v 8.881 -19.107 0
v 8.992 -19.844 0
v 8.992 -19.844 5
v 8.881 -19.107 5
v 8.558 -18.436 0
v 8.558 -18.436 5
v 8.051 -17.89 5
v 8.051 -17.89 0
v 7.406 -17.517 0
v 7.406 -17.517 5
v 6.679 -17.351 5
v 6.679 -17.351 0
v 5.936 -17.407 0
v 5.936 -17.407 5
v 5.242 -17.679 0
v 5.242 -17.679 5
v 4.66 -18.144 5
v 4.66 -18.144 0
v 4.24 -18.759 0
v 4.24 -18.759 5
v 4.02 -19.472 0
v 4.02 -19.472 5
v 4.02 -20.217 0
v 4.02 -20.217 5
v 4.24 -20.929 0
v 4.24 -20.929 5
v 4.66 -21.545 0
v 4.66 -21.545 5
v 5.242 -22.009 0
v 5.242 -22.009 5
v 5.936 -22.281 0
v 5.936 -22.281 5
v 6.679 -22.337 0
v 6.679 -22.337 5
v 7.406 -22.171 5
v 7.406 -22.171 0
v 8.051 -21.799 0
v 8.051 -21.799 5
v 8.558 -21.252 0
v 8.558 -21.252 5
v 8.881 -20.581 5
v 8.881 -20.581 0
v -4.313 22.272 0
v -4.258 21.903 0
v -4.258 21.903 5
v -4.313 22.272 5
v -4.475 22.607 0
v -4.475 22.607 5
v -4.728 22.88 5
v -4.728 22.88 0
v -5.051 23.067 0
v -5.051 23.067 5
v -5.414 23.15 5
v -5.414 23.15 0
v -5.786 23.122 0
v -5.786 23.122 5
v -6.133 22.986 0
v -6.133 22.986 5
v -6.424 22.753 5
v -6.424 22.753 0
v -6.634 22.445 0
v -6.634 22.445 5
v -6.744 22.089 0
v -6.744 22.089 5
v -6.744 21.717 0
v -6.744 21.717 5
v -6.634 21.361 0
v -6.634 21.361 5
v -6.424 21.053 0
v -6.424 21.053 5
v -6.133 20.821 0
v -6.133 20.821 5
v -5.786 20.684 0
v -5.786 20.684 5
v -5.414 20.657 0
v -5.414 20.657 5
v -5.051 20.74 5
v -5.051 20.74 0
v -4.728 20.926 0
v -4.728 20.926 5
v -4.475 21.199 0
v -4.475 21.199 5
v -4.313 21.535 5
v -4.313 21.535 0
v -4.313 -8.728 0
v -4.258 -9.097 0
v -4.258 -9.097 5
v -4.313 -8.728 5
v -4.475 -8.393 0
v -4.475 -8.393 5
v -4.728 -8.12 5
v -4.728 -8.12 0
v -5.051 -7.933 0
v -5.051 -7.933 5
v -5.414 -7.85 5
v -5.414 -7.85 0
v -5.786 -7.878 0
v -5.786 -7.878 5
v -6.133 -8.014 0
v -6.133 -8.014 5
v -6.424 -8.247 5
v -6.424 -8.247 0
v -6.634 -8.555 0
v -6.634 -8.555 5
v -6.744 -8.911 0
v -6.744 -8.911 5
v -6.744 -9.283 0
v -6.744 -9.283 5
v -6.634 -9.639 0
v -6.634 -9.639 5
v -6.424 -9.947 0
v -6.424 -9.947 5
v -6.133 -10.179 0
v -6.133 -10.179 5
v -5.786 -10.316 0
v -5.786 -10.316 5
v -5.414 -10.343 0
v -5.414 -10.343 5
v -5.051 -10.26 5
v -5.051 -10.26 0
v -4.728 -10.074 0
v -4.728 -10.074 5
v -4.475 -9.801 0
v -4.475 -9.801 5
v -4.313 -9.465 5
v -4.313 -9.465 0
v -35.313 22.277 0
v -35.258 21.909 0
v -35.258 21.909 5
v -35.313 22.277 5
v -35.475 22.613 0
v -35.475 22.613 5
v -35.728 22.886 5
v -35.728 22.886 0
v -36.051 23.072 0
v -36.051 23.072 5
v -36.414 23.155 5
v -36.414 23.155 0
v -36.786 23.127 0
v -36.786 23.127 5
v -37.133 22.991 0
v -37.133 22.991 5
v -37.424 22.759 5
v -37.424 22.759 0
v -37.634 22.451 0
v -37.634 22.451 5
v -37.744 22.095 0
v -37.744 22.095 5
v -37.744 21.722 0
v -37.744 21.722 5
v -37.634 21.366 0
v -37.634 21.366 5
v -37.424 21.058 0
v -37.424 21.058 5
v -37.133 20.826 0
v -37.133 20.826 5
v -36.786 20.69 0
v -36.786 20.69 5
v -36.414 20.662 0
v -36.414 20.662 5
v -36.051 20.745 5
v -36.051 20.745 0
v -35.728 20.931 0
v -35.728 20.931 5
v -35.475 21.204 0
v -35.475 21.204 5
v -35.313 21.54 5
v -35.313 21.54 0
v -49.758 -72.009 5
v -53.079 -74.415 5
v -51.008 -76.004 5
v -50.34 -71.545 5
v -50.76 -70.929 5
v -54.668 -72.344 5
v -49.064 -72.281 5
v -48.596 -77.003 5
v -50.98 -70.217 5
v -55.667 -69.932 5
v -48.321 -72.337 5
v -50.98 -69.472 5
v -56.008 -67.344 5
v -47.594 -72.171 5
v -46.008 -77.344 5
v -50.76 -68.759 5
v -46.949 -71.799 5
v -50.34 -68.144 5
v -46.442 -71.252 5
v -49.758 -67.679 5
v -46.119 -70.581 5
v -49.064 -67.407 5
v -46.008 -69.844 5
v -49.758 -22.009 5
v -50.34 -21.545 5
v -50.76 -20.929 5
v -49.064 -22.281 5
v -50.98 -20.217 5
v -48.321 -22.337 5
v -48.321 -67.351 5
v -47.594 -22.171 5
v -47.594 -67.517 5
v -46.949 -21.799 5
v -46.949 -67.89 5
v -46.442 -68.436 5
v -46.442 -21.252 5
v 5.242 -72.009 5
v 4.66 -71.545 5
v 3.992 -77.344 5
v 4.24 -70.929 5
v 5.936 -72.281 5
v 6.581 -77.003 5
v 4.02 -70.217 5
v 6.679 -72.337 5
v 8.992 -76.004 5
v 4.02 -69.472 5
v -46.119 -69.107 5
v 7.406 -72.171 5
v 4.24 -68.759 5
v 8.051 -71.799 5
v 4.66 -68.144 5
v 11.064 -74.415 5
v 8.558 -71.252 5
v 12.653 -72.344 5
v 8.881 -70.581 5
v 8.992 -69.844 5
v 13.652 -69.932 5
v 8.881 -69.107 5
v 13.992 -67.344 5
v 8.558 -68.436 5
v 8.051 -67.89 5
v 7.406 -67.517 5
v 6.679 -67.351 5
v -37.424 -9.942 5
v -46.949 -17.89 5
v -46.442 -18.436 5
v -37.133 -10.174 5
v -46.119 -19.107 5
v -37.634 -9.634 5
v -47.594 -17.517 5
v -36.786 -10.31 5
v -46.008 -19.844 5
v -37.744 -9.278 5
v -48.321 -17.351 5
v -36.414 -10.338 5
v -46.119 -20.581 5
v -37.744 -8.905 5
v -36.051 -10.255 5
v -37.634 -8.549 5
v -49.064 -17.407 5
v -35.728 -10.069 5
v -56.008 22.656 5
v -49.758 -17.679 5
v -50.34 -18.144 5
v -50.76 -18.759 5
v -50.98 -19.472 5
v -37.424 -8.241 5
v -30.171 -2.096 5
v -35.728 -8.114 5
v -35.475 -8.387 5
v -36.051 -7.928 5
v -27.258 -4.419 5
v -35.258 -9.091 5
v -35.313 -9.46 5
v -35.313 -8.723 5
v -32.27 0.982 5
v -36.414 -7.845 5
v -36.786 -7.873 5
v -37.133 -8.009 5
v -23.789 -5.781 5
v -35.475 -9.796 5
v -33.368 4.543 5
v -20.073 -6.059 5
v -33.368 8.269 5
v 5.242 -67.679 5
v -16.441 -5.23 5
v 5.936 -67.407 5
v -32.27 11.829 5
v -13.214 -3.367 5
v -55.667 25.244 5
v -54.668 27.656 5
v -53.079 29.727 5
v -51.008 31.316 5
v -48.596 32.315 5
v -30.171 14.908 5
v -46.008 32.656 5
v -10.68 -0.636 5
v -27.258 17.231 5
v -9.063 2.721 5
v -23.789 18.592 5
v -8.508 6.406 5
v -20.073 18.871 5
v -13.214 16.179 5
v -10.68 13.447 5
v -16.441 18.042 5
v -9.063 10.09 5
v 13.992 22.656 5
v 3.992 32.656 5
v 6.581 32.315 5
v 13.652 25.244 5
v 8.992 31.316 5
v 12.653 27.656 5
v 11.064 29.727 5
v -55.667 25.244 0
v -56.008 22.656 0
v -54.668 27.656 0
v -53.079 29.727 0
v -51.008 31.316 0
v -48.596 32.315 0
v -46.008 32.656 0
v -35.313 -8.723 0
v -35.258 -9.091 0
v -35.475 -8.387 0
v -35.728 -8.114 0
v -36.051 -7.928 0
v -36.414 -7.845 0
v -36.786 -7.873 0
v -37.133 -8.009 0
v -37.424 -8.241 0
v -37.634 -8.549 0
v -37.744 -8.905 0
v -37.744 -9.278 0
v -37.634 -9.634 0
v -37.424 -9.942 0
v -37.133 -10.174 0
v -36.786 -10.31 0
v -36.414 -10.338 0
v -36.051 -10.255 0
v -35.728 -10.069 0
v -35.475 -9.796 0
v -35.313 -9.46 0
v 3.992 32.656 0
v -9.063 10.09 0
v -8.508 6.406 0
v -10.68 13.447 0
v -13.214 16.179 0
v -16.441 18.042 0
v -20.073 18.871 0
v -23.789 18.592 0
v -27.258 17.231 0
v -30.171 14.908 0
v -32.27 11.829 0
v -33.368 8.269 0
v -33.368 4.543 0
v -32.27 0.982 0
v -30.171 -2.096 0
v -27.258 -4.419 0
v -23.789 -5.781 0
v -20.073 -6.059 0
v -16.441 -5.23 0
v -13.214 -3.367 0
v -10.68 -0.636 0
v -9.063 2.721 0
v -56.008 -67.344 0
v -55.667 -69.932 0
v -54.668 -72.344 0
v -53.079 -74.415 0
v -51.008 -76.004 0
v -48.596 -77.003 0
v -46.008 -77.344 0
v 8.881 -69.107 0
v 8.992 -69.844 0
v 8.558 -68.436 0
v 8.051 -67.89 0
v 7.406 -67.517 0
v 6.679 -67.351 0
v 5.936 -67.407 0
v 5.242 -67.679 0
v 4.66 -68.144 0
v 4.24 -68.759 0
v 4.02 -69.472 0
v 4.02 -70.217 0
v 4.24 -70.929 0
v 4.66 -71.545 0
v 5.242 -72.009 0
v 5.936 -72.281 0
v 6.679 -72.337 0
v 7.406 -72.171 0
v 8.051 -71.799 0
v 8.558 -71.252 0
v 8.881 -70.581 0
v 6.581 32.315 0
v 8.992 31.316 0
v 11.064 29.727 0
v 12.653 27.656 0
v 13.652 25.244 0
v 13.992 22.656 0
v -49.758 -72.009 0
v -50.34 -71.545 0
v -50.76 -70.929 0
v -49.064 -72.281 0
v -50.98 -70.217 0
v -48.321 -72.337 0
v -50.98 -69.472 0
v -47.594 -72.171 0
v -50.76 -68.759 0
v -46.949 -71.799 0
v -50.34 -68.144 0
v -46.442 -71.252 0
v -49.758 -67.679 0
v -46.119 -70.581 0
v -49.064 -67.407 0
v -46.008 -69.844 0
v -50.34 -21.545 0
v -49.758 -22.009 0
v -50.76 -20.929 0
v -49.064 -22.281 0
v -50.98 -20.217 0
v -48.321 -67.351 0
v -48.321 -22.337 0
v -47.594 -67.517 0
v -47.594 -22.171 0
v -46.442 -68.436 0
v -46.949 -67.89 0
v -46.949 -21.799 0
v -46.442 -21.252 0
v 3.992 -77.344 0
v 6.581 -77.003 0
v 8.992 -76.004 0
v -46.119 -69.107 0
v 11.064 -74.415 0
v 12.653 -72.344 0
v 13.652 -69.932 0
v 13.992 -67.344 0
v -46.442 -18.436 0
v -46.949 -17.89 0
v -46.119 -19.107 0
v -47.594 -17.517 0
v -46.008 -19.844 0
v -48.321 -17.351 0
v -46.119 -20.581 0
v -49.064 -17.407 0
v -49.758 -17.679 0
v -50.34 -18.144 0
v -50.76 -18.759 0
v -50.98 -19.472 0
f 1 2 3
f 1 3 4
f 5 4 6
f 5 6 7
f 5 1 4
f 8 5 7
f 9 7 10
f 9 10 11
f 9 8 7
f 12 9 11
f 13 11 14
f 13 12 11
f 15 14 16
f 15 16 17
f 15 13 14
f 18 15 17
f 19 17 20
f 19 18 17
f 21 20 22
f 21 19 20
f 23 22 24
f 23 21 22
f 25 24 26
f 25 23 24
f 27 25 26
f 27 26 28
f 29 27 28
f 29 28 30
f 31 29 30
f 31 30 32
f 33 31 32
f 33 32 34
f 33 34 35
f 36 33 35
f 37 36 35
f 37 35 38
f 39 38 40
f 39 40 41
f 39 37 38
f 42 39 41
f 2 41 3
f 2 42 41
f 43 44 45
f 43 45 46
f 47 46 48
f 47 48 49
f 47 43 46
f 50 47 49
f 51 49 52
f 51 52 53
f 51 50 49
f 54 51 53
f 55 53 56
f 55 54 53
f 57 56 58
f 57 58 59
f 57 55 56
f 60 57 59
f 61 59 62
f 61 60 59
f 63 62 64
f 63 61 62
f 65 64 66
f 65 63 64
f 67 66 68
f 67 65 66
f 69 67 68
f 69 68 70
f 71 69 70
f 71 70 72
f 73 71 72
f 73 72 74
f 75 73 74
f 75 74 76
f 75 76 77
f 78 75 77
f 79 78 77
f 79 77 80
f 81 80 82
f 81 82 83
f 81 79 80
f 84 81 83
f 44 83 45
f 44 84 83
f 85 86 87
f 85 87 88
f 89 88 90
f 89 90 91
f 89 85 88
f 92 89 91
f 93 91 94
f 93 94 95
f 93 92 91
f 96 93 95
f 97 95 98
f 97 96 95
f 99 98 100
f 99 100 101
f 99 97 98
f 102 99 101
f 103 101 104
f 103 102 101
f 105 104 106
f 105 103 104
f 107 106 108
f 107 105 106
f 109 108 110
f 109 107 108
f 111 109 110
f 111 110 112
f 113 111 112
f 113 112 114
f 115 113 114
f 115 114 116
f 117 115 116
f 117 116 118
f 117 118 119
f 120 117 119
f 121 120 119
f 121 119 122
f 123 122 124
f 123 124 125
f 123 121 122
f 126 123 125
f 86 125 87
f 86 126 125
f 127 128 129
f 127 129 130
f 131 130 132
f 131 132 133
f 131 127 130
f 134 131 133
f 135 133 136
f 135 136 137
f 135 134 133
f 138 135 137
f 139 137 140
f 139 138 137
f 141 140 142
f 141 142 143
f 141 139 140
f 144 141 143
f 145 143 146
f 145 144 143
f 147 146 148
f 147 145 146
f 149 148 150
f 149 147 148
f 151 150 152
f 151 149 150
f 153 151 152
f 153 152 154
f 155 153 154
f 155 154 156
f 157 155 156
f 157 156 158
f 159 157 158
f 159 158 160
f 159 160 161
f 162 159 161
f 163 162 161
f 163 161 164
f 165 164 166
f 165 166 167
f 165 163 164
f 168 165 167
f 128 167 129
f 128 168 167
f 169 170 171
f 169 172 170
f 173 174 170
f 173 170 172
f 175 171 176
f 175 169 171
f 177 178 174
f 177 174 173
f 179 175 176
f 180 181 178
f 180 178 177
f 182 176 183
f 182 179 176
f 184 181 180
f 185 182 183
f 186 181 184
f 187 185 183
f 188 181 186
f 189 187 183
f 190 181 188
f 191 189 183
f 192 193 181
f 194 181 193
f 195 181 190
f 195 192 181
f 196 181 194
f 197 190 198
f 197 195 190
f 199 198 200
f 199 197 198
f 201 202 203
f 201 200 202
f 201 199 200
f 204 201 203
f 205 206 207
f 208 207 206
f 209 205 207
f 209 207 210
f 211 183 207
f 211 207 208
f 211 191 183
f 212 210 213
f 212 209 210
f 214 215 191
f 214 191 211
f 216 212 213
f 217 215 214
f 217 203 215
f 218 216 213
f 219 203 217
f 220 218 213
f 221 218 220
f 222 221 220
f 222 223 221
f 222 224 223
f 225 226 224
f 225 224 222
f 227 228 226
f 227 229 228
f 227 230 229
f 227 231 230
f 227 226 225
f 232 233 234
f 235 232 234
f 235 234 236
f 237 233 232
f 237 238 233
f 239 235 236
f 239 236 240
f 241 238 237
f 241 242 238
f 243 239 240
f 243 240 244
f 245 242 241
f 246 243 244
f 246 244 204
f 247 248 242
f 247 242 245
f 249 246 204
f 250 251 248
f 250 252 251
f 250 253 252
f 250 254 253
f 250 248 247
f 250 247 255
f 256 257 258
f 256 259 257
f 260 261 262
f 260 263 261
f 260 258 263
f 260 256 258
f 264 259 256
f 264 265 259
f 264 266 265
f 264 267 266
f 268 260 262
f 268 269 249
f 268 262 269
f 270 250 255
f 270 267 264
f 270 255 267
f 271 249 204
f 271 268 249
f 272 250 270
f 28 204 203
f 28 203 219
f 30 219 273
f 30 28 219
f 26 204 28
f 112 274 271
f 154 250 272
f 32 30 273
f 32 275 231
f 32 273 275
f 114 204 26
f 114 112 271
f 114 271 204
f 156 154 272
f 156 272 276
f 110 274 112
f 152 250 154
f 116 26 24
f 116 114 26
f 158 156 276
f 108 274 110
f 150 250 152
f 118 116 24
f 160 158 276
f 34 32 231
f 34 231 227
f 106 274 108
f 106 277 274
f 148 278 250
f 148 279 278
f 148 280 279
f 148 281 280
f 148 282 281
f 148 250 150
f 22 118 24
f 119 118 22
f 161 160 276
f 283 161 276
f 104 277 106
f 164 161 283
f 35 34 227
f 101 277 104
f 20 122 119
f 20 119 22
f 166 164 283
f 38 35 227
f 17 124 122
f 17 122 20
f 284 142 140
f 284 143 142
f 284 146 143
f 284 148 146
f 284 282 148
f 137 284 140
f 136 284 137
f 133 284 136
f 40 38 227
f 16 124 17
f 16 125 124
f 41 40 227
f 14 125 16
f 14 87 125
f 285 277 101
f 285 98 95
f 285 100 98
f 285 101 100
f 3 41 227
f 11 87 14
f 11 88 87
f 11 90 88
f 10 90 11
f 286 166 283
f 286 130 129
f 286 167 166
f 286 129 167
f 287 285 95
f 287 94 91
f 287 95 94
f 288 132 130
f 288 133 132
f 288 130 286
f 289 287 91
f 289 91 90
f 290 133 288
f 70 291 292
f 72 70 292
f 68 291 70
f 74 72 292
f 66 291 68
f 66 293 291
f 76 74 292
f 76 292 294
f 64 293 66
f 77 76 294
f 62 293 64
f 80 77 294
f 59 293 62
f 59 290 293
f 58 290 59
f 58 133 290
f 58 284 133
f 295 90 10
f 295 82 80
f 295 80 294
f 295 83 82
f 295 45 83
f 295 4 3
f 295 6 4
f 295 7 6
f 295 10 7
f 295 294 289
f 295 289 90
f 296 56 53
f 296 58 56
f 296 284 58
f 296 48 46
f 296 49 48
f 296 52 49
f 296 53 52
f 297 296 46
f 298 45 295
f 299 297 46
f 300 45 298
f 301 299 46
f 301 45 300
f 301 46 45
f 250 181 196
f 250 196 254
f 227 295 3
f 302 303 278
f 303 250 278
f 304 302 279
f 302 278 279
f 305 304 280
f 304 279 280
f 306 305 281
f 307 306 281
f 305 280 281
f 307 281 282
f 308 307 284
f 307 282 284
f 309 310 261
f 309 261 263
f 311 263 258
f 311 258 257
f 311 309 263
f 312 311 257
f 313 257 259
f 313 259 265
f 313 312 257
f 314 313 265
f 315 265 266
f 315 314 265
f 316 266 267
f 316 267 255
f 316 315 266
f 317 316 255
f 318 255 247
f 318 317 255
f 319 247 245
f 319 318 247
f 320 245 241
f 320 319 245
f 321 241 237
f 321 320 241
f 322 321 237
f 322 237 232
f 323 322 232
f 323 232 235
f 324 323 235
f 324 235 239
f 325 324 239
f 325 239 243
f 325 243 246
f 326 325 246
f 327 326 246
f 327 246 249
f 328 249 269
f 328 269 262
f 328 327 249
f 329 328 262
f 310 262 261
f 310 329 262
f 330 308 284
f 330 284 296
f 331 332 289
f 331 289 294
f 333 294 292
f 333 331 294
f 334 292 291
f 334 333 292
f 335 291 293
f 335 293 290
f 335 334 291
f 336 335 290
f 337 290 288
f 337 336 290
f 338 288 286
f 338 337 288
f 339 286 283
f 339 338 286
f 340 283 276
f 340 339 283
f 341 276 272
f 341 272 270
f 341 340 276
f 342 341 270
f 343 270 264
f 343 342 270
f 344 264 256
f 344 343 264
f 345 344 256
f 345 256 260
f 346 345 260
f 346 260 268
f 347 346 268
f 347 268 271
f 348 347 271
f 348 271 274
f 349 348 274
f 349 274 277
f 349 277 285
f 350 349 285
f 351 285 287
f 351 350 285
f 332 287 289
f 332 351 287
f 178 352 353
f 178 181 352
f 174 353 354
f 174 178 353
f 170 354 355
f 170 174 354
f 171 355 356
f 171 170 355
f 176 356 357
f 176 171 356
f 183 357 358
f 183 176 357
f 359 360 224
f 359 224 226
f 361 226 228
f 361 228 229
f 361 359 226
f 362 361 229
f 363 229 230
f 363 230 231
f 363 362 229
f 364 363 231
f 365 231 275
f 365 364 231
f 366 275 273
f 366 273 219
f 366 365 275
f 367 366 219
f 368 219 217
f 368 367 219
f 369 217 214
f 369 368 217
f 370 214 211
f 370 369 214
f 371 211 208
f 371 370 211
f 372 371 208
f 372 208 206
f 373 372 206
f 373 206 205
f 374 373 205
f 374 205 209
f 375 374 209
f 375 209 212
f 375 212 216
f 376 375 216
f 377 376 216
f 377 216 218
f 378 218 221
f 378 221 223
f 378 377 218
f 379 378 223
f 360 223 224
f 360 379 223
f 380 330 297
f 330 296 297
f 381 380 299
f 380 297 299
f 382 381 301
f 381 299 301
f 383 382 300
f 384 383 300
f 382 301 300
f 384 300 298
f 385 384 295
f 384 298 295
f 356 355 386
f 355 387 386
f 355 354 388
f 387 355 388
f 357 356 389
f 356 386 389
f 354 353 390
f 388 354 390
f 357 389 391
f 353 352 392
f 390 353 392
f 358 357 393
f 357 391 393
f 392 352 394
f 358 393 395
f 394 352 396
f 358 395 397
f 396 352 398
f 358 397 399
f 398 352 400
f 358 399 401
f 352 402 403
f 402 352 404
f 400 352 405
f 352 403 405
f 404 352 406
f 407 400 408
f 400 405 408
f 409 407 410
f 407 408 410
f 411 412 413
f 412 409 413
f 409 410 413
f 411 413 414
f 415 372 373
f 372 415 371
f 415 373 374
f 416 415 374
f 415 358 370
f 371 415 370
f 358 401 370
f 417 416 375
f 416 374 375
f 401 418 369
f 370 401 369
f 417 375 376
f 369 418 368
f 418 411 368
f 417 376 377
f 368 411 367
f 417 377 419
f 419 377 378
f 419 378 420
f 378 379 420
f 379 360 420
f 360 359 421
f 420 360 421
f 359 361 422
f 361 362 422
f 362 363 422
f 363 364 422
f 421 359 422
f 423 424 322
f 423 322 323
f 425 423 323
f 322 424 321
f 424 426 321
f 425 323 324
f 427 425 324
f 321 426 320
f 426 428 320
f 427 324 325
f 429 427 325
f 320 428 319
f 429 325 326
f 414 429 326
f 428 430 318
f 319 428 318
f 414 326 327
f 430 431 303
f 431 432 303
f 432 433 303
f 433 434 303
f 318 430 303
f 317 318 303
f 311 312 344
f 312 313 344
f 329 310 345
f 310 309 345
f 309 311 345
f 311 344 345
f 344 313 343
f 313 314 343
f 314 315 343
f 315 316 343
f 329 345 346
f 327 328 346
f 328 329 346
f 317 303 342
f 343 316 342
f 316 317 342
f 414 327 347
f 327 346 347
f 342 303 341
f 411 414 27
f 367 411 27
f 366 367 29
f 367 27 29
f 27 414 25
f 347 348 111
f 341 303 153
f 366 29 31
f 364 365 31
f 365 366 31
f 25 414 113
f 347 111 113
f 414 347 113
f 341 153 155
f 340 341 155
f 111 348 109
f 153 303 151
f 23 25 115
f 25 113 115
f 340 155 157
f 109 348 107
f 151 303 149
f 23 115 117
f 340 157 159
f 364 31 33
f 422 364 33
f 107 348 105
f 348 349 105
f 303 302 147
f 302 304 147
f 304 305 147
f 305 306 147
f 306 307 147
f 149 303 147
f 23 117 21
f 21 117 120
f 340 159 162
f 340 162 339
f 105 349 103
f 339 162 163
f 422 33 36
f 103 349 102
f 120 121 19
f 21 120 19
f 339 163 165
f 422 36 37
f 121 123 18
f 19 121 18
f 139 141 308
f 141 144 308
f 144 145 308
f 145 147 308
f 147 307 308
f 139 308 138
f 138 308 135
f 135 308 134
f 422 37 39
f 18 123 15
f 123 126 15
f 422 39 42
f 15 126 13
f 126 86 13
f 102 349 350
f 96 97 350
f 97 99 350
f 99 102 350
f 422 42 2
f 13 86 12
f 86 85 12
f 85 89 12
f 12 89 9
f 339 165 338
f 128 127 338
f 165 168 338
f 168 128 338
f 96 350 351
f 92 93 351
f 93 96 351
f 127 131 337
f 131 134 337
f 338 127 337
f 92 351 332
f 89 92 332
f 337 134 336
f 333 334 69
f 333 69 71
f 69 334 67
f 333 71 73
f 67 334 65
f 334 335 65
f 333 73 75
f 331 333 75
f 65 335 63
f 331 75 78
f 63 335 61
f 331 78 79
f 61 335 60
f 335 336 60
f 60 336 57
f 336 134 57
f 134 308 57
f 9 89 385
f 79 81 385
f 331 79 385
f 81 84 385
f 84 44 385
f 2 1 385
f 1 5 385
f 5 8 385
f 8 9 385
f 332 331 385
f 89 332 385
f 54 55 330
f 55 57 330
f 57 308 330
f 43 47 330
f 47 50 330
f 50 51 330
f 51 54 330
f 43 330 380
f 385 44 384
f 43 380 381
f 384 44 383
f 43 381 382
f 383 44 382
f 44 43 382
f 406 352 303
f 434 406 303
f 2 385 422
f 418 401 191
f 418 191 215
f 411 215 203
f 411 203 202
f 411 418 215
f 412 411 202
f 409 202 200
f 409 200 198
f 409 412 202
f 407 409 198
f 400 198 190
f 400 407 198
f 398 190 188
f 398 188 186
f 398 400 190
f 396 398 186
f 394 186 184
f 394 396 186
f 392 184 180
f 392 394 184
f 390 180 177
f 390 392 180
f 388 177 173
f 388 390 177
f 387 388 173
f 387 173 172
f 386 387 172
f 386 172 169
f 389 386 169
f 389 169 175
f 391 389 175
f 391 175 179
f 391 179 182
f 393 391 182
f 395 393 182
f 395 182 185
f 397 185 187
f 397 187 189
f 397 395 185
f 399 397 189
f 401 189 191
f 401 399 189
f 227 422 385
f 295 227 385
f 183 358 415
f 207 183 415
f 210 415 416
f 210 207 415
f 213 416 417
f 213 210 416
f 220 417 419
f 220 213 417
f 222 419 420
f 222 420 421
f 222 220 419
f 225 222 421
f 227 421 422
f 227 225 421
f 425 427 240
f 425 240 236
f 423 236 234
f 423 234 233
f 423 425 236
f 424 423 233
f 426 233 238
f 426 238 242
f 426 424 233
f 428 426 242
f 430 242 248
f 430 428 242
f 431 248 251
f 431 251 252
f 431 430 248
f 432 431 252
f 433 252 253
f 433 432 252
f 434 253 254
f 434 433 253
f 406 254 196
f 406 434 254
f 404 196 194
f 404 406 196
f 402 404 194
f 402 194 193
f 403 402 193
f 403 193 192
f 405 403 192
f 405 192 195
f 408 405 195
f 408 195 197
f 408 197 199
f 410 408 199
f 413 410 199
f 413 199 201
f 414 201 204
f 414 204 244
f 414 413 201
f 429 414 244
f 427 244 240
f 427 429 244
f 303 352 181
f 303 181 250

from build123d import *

# Parameters (mm, degrees)
SKETCH1_W           = 70
SKETCH1_H           = 110
SKETCH1_R           = 2.5
SKETCH1_R_2         = 12.5
SKETCH1_R_3         = 1.25
BOSS_EXTRUDE1_DEPTH = 5
FILLET1_R           = 10


with BuildPart() as part:
    # Sketch1 → Boss-Extrude1 (new body)
    with BuildSketch(Plane.XY):
        with Locations((-21.007524629, -22.344146878)):
            Rectangle(SKETCH1_W, SKETCH1_H)
        with Locations((-48.507524629, -19.844146878)):
            Circle(SKETCH1_R, mode=Mode.SUBTRACT)
        with Locations((6.492475371, -19.844146878)):
            Circle(SKETCH1_R, mode=Mode.SUBTRACT)
        with Locations((-48.507524629, -69.844146878)):
            Circle(SKETCH1_R, mode=Mode.SUBTRACT)
        with Locations((6.492475371, -69.844146878)):
            Circle(SKETCH1_R, mode=Mode.SUBTRACT)
        with Locations((-21.007524629, 6.405853122)):
            Circle(SKETCH1_R_2, mode=Mode.SUBTRACT)
        with Locations((-36.507524629, 21.908578371)):
            Circle(SKETCH1_R_3, mode=Mode.SUBTRACT)
        with Locations((-5.507524629, 21.903128352)):
            Circle(SKETCH1_R_3, mode=Mode.SUBTRACT)
        with Locations((-5.507524629, -9.096872127)):
            Circle(SKETCH1_R_3, mode=Mode.SUBTRACT)
        with Locations((-36.507524629, -9.091422108)):
            Circle(SKETCH1_R_3, mode=Mode.SUBTRACT)
    extrude(amount=BOSS_EXTRUDE1_DEPTH)

    # Fillet1
    fillet1_edges = [part.edges().sort_by_distance(p)[0] for p in [
        (-56.007524629, 32.655853122, 2.5),
        (13.992475371, 32.655853122, 2.5),
        (13.992475371, -77.344146878, 2.5),
        (-56.007524629, -77.344146878, 2.5),
    ]]
    fillet(fillet1_edges, radius=FILLET1_R)


solid = part.part
